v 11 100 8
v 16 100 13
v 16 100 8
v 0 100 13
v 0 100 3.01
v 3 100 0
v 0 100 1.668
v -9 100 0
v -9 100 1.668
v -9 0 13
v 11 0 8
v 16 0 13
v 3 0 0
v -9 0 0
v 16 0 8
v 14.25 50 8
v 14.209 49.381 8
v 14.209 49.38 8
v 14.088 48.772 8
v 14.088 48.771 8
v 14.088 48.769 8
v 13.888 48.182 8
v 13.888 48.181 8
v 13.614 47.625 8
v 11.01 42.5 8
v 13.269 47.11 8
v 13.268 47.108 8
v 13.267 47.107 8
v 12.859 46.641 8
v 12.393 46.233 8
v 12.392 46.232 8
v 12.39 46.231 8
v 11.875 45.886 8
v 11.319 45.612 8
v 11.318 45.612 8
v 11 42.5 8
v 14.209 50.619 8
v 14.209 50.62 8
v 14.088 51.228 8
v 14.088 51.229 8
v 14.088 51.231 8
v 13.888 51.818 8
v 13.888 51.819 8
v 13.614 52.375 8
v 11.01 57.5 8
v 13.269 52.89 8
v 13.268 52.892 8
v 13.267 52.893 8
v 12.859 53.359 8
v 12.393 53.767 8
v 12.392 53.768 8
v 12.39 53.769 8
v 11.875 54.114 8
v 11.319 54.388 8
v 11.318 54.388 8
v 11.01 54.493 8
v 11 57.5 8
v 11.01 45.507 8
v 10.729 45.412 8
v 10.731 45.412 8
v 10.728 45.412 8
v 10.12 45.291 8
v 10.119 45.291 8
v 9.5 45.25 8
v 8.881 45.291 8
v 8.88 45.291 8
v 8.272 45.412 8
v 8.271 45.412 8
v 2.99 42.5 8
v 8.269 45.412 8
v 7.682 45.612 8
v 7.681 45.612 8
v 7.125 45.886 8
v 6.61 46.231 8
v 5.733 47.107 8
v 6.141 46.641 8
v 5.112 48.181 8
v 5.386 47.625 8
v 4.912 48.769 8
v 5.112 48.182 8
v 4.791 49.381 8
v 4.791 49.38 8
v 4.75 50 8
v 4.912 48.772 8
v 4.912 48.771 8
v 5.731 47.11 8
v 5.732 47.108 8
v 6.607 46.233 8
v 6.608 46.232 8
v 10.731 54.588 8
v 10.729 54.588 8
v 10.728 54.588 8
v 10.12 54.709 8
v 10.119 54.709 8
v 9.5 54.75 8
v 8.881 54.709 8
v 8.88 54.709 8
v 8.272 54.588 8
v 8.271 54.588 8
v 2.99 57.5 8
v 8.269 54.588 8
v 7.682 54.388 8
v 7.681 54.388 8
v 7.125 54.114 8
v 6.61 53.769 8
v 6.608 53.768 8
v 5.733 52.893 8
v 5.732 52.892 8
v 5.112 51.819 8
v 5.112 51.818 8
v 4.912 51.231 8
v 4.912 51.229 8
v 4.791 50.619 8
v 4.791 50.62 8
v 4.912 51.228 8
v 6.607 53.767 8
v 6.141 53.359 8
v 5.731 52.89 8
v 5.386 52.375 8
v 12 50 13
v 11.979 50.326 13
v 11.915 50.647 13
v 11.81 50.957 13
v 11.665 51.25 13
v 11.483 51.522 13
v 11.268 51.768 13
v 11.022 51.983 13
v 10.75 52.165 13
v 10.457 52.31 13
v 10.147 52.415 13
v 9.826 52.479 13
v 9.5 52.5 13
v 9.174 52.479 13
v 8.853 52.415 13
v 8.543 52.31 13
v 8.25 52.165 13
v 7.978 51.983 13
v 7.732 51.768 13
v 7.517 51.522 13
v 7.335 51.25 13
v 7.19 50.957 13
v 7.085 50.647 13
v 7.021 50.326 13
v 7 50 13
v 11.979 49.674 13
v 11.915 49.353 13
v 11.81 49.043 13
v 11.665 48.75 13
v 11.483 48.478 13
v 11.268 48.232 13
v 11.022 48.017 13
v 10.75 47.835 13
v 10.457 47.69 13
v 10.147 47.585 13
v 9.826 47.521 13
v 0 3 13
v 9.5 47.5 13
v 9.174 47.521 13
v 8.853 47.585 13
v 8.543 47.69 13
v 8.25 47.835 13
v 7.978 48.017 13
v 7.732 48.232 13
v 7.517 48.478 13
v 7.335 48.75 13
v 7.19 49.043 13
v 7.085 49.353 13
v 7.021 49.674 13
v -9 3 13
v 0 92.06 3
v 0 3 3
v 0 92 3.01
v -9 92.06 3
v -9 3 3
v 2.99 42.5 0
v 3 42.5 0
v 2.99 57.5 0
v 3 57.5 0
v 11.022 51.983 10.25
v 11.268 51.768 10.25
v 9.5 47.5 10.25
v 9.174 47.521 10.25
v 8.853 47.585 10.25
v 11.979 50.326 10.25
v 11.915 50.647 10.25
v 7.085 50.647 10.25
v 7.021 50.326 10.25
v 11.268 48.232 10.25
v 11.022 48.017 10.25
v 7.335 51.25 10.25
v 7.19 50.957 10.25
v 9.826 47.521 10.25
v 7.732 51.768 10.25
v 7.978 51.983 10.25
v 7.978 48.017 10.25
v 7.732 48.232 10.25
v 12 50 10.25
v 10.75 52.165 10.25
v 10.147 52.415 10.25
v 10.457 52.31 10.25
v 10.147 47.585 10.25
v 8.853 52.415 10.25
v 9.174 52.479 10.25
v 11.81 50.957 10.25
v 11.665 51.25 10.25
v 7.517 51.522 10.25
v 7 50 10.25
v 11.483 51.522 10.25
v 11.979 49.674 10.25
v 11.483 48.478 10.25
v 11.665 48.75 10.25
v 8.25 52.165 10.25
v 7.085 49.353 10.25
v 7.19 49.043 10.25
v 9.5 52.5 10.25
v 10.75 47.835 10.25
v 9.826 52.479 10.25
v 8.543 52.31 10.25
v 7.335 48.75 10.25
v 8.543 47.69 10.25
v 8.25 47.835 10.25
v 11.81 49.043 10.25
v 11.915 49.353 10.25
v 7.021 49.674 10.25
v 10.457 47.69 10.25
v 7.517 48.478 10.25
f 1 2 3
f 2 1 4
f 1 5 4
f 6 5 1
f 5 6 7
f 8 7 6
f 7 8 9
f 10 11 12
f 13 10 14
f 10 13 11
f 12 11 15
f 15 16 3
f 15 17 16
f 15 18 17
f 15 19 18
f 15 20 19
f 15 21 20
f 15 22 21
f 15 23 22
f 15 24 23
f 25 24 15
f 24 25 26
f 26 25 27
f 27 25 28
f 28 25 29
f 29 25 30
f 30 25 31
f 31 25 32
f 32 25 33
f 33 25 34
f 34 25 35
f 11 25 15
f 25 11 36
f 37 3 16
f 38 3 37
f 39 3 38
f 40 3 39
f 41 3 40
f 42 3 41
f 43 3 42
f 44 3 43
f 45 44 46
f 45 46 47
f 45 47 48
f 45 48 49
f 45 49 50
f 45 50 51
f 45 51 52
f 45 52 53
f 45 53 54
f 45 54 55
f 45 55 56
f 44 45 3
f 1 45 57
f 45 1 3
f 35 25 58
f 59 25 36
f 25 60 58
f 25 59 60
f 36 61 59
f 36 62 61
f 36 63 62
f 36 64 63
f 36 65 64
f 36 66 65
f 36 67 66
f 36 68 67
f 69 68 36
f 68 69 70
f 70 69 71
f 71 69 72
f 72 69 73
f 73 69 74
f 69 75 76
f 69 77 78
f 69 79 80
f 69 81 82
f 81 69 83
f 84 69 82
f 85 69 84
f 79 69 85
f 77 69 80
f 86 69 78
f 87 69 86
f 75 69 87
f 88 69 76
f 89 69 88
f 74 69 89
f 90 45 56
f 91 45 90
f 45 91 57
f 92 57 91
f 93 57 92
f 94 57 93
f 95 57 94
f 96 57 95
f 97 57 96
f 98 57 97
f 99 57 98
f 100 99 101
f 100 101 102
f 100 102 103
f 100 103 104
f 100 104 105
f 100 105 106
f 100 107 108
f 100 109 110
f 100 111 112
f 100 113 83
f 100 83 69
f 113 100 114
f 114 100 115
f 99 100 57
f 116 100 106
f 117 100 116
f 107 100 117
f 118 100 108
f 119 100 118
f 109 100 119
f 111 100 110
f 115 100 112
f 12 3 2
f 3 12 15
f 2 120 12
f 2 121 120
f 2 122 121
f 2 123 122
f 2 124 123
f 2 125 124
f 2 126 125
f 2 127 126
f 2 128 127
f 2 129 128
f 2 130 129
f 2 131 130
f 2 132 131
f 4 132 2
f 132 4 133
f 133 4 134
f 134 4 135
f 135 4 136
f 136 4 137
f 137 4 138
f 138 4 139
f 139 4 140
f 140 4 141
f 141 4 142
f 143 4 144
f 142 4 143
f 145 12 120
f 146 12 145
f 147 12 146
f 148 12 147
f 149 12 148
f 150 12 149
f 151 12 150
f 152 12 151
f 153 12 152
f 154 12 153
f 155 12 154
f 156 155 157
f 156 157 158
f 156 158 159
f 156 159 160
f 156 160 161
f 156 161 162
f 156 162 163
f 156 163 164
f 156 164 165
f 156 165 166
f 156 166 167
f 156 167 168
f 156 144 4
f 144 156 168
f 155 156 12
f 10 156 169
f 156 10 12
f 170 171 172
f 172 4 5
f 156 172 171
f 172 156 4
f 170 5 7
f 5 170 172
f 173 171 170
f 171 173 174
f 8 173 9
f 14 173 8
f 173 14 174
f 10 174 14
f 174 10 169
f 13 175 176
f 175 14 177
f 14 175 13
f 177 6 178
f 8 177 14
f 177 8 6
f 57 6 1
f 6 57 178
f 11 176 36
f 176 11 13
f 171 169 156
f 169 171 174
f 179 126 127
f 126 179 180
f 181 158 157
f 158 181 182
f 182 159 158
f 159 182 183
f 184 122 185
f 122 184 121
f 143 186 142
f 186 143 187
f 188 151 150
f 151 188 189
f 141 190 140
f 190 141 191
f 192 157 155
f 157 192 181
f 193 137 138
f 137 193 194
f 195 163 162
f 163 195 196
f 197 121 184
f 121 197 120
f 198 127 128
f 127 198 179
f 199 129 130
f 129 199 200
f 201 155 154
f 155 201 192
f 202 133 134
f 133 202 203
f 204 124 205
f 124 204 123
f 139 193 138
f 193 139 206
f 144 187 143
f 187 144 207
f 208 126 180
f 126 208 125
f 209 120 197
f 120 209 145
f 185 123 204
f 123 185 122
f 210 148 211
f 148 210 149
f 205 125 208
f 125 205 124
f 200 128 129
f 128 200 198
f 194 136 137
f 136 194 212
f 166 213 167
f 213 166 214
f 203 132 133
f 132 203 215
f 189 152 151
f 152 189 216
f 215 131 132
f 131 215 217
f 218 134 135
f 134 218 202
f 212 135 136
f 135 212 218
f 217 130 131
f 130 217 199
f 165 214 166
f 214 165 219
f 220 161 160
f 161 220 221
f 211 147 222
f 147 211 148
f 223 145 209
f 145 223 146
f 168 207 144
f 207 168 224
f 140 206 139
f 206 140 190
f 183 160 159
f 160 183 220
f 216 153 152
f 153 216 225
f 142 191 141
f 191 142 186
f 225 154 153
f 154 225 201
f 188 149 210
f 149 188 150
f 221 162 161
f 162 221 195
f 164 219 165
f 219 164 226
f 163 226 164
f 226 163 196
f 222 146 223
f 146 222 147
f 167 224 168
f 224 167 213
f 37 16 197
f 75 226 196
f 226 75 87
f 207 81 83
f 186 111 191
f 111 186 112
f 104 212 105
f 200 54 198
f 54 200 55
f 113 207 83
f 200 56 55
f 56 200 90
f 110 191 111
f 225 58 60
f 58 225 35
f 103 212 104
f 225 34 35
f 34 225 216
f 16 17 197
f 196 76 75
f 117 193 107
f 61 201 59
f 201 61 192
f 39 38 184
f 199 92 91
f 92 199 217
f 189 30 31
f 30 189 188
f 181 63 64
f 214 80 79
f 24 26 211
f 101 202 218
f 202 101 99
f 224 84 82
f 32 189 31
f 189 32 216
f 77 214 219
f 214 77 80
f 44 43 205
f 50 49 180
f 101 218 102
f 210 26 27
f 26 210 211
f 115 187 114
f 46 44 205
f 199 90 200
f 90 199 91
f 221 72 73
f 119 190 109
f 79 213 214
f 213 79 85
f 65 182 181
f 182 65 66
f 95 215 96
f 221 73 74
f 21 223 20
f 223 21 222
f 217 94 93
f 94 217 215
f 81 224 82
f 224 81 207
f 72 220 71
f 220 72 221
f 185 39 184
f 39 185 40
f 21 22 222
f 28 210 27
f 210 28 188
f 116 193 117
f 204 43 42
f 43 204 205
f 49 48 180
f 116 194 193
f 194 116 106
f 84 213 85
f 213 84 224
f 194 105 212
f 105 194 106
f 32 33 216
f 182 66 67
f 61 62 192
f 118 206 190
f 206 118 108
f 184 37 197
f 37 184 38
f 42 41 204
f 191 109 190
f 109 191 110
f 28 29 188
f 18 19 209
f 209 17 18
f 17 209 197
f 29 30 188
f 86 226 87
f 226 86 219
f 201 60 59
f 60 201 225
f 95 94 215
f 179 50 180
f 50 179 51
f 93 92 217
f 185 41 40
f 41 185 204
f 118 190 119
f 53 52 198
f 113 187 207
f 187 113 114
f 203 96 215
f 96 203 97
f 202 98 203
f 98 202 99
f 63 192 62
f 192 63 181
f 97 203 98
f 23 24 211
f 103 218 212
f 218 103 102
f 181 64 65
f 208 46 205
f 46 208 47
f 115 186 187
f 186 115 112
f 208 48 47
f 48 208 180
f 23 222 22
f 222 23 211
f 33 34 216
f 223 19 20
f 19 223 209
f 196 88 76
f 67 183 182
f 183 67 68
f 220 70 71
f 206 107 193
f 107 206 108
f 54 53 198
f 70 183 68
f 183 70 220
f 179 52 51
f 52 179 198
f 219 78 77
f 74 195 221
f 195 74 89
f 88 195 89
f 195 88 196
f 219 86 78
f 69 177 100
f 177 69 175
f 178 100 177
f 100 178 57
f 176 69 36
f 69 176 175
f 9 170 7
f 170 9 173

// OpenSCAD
// ---------------------------------------------------------------------------
// Under-desk keyboard rails
//
// A channel that screws to the underside of a desk. Print two - one as it
// stands, one mirrored - screw them up the width of your keyboard apart, and
// the keyboard slides in from the front and hangs out of the way.
//
// One screw each on purpose: the spacing is yours to set when you mark the
// holes, so the same part fits any width of keyboard.
//
//   x = across, 0 = the face the keyboard's edge runs against, +x outboard
//   y = along the rail, 0 = back
//   z = height, 0 = desk underside, -z = down
//
// Render:  openscad -o right.stl under_desk_keyboard_rail.scad
//          openscad -o left.stl -D MIRROR=true under_desk_keyboard_rail.scad
// ---------------------------------------------------------------------------

/* [Keyboard] */
KB_H = 9.0;              // height at its thickest point
KB_D = 103.0;            // front to back

/* [Fit] */
GAP_H = 1.0;             // clearance above the keyboard
GAP_W = 1.5;             // total side slack, split between the two rails

/* [Rail] */
RAIL_L = 100.0;          // length; a little under the keyboard depth
LIP_IN = 9.0;            // how far the lip reaches under the keyboard
LIP_T  = 3.0;            // lip thickness
WALL   = 3.0;            // side wall
PAD_W  = 13.0;           // mounting pad, outboard of the wall
PAD_T  = 5.0;            // pad thickness
GUSSET = 8.0;            // 45 degree gusset carrying the pad
WINDOW = 15.0;           // gap in the gusset at the screw, so a driver fits
STOP_T = 3.0;            // rear stop, so the keyboard lands in the same place
LEAD   = 8.0;            // lead-in ramp at the mouth
LEAD_D = 1.5;

/* [Fastener] One #8 or M4 flat-head wood screw per rail */
SCREW_D   = 5.0;         // clearance hole
HEAD_D    = 9.5;         // countersink top diameter
CSK_ANGLE = 90.0;

/* [Output] */
MIRROR = false;              // true for the left-hand rail
SHOW_KB = false;             // preview the keyboard edge in place
$fn = 48;

// --------------------------- derived --------------------------------------

CH_H  = KB_H + GAP_H;            // channel height
H     = CH_H + LIP_T;            // total drop below the desk
Z_LIP = -CH_H;                   // the face the keyboard rests on
Z_BOT = -H;
PAD_X = WALL + PAD_W;            // outer edge of the pad
SCREW_X = WALL + PAD_W / 2;
CSK_DEPTH = (HEAD_D - SCREW_D) / 2 / tan(CSK_ANGLE / 2);
OVERHANG = PAD_W - GUSSET;       // strip of pad underside the gusset misses
EPS = 0.01;

assert(GUSSET == H - PAD_T, "the gusset is not a 45 degree run to the wall foot");
assert(WINDOW > HEAD_D + 4, "no room to get a driver into the gusset window");
assert(PAD_T > CSK_DEPTH + 1.5, "too little pad left under the countersink");
assert(SCREW_X - HEAD_D / 2 > WALL, "the screw head overhangs the wall");
assert(SCREW_X + HEAD_D / 2 < PAD_X, "the screw head overhangs the pad");
assert(RAIL_L < KB_D, "rail is longer than the keyboard is deep");

// --------------------------- helpers --------------------------------------

module boxc(x0, x1, y0, y1, z0, z1) {
    translate([x0, y0, z0]) cube([x1 - x0, y1 - y0, z1 - z0]);
}

// Convex (y,z) profile swept along x.
module extrude_x(profile, x0, x1) {
    translate([x0, 0, 0]) rotate([0, 90, 0]) rotate([0, 0, 90])
        linear_extrude(height = x1 - x0) polygon(profile);
}

// --------------------------- the part --------------------------------------

// Section through the rail: lip, wall, pad, and a gusset under the pad. The
// whole rail is this swept along its length, which is why there is nothing to
// it. The channel corner is left square - a fillet there would print nicely
// but it sits exactly where the keyboard's bottom edge wants to be.
module section() {
    polygon([[-LIP_IN, Z_BOT], [-LIP_IN, Z_LIP], [0, Z_LIP], [0, 0],
             [PAD_X, 0], [PAD_X, -PAD_T], [WALL + GUSSET, -PAD_T],
             [WALL, Z_BOT]]);
}

module rail() {
    difference() {
        union() {
            translate([0, RAIL_L, 0]) rotate([90, 0, 0])
                linear_extrude(height = RAIL_L) section();
            // Rear stop: push the keyboard in until it touches.
            boxc(-LIP_IN, WALL, 0, STOP_T, Z_LIP, 0);
        }
        // Screw, countersunk from below. Printed pad-down this cone opens
        // upward, so it needs no support and seats a flat head square.
        translate([SCREW_X, RAIL_L / 2, -PAD_T - EPS]) {
            cylinder(h = PAD_T + 2 * EPS, d = SCREW_D);
            cylinder(h = CSK_DEPTH + EPS, d1 = HEAD_D + 2 * EPS, d2 = SCREW_D);
        }
        // Gap in the gusset at the screw. The pad bridges it in about 15 mm,
        // which prints; a gusset running under the head would not let a
        // driver anywhere near it.
        boxc(WALL - EPS, WALL + GUSSET + EPS,
             RAIL_L / 2 - WINDOW / 2, RAIL_L / 2 + WINDOW / 2,
             Z_BOT - EPS, -PAD_T);
        // Lead-in at the mouth, so the keyboard finds the channel. It stops
        // dead on the wall face: overshooting into the wall leaves a sliver of
        // material hanging off it at rest-face height.
        extrude_x([[RAIL_L - LEAD, Z_LIP + EPS], [RAIL_L + 1, Z_LIP + EPS],
                   [RAIL_L + 1, Z_LIP - LEAD_D]], -LIP_IN - 1, 0);
    }
}

// It prints the way it hangs, just set down on the bed: the lip's underside is
// the first layer, the keyboard's rest face and the wall come out clean, and
// the only overhang is the strip of pad underside past the gusset.
module printable() {
    translate([0, 0, H]) rail();
}

mirror([MIRROR ? 1 : 0, 0, 0]) {
    printable();
    if (SHOW_KB)
        %translate([-60, STOP_T, Z_LIP]) cube([60, KB_D, KB_H]);
}
